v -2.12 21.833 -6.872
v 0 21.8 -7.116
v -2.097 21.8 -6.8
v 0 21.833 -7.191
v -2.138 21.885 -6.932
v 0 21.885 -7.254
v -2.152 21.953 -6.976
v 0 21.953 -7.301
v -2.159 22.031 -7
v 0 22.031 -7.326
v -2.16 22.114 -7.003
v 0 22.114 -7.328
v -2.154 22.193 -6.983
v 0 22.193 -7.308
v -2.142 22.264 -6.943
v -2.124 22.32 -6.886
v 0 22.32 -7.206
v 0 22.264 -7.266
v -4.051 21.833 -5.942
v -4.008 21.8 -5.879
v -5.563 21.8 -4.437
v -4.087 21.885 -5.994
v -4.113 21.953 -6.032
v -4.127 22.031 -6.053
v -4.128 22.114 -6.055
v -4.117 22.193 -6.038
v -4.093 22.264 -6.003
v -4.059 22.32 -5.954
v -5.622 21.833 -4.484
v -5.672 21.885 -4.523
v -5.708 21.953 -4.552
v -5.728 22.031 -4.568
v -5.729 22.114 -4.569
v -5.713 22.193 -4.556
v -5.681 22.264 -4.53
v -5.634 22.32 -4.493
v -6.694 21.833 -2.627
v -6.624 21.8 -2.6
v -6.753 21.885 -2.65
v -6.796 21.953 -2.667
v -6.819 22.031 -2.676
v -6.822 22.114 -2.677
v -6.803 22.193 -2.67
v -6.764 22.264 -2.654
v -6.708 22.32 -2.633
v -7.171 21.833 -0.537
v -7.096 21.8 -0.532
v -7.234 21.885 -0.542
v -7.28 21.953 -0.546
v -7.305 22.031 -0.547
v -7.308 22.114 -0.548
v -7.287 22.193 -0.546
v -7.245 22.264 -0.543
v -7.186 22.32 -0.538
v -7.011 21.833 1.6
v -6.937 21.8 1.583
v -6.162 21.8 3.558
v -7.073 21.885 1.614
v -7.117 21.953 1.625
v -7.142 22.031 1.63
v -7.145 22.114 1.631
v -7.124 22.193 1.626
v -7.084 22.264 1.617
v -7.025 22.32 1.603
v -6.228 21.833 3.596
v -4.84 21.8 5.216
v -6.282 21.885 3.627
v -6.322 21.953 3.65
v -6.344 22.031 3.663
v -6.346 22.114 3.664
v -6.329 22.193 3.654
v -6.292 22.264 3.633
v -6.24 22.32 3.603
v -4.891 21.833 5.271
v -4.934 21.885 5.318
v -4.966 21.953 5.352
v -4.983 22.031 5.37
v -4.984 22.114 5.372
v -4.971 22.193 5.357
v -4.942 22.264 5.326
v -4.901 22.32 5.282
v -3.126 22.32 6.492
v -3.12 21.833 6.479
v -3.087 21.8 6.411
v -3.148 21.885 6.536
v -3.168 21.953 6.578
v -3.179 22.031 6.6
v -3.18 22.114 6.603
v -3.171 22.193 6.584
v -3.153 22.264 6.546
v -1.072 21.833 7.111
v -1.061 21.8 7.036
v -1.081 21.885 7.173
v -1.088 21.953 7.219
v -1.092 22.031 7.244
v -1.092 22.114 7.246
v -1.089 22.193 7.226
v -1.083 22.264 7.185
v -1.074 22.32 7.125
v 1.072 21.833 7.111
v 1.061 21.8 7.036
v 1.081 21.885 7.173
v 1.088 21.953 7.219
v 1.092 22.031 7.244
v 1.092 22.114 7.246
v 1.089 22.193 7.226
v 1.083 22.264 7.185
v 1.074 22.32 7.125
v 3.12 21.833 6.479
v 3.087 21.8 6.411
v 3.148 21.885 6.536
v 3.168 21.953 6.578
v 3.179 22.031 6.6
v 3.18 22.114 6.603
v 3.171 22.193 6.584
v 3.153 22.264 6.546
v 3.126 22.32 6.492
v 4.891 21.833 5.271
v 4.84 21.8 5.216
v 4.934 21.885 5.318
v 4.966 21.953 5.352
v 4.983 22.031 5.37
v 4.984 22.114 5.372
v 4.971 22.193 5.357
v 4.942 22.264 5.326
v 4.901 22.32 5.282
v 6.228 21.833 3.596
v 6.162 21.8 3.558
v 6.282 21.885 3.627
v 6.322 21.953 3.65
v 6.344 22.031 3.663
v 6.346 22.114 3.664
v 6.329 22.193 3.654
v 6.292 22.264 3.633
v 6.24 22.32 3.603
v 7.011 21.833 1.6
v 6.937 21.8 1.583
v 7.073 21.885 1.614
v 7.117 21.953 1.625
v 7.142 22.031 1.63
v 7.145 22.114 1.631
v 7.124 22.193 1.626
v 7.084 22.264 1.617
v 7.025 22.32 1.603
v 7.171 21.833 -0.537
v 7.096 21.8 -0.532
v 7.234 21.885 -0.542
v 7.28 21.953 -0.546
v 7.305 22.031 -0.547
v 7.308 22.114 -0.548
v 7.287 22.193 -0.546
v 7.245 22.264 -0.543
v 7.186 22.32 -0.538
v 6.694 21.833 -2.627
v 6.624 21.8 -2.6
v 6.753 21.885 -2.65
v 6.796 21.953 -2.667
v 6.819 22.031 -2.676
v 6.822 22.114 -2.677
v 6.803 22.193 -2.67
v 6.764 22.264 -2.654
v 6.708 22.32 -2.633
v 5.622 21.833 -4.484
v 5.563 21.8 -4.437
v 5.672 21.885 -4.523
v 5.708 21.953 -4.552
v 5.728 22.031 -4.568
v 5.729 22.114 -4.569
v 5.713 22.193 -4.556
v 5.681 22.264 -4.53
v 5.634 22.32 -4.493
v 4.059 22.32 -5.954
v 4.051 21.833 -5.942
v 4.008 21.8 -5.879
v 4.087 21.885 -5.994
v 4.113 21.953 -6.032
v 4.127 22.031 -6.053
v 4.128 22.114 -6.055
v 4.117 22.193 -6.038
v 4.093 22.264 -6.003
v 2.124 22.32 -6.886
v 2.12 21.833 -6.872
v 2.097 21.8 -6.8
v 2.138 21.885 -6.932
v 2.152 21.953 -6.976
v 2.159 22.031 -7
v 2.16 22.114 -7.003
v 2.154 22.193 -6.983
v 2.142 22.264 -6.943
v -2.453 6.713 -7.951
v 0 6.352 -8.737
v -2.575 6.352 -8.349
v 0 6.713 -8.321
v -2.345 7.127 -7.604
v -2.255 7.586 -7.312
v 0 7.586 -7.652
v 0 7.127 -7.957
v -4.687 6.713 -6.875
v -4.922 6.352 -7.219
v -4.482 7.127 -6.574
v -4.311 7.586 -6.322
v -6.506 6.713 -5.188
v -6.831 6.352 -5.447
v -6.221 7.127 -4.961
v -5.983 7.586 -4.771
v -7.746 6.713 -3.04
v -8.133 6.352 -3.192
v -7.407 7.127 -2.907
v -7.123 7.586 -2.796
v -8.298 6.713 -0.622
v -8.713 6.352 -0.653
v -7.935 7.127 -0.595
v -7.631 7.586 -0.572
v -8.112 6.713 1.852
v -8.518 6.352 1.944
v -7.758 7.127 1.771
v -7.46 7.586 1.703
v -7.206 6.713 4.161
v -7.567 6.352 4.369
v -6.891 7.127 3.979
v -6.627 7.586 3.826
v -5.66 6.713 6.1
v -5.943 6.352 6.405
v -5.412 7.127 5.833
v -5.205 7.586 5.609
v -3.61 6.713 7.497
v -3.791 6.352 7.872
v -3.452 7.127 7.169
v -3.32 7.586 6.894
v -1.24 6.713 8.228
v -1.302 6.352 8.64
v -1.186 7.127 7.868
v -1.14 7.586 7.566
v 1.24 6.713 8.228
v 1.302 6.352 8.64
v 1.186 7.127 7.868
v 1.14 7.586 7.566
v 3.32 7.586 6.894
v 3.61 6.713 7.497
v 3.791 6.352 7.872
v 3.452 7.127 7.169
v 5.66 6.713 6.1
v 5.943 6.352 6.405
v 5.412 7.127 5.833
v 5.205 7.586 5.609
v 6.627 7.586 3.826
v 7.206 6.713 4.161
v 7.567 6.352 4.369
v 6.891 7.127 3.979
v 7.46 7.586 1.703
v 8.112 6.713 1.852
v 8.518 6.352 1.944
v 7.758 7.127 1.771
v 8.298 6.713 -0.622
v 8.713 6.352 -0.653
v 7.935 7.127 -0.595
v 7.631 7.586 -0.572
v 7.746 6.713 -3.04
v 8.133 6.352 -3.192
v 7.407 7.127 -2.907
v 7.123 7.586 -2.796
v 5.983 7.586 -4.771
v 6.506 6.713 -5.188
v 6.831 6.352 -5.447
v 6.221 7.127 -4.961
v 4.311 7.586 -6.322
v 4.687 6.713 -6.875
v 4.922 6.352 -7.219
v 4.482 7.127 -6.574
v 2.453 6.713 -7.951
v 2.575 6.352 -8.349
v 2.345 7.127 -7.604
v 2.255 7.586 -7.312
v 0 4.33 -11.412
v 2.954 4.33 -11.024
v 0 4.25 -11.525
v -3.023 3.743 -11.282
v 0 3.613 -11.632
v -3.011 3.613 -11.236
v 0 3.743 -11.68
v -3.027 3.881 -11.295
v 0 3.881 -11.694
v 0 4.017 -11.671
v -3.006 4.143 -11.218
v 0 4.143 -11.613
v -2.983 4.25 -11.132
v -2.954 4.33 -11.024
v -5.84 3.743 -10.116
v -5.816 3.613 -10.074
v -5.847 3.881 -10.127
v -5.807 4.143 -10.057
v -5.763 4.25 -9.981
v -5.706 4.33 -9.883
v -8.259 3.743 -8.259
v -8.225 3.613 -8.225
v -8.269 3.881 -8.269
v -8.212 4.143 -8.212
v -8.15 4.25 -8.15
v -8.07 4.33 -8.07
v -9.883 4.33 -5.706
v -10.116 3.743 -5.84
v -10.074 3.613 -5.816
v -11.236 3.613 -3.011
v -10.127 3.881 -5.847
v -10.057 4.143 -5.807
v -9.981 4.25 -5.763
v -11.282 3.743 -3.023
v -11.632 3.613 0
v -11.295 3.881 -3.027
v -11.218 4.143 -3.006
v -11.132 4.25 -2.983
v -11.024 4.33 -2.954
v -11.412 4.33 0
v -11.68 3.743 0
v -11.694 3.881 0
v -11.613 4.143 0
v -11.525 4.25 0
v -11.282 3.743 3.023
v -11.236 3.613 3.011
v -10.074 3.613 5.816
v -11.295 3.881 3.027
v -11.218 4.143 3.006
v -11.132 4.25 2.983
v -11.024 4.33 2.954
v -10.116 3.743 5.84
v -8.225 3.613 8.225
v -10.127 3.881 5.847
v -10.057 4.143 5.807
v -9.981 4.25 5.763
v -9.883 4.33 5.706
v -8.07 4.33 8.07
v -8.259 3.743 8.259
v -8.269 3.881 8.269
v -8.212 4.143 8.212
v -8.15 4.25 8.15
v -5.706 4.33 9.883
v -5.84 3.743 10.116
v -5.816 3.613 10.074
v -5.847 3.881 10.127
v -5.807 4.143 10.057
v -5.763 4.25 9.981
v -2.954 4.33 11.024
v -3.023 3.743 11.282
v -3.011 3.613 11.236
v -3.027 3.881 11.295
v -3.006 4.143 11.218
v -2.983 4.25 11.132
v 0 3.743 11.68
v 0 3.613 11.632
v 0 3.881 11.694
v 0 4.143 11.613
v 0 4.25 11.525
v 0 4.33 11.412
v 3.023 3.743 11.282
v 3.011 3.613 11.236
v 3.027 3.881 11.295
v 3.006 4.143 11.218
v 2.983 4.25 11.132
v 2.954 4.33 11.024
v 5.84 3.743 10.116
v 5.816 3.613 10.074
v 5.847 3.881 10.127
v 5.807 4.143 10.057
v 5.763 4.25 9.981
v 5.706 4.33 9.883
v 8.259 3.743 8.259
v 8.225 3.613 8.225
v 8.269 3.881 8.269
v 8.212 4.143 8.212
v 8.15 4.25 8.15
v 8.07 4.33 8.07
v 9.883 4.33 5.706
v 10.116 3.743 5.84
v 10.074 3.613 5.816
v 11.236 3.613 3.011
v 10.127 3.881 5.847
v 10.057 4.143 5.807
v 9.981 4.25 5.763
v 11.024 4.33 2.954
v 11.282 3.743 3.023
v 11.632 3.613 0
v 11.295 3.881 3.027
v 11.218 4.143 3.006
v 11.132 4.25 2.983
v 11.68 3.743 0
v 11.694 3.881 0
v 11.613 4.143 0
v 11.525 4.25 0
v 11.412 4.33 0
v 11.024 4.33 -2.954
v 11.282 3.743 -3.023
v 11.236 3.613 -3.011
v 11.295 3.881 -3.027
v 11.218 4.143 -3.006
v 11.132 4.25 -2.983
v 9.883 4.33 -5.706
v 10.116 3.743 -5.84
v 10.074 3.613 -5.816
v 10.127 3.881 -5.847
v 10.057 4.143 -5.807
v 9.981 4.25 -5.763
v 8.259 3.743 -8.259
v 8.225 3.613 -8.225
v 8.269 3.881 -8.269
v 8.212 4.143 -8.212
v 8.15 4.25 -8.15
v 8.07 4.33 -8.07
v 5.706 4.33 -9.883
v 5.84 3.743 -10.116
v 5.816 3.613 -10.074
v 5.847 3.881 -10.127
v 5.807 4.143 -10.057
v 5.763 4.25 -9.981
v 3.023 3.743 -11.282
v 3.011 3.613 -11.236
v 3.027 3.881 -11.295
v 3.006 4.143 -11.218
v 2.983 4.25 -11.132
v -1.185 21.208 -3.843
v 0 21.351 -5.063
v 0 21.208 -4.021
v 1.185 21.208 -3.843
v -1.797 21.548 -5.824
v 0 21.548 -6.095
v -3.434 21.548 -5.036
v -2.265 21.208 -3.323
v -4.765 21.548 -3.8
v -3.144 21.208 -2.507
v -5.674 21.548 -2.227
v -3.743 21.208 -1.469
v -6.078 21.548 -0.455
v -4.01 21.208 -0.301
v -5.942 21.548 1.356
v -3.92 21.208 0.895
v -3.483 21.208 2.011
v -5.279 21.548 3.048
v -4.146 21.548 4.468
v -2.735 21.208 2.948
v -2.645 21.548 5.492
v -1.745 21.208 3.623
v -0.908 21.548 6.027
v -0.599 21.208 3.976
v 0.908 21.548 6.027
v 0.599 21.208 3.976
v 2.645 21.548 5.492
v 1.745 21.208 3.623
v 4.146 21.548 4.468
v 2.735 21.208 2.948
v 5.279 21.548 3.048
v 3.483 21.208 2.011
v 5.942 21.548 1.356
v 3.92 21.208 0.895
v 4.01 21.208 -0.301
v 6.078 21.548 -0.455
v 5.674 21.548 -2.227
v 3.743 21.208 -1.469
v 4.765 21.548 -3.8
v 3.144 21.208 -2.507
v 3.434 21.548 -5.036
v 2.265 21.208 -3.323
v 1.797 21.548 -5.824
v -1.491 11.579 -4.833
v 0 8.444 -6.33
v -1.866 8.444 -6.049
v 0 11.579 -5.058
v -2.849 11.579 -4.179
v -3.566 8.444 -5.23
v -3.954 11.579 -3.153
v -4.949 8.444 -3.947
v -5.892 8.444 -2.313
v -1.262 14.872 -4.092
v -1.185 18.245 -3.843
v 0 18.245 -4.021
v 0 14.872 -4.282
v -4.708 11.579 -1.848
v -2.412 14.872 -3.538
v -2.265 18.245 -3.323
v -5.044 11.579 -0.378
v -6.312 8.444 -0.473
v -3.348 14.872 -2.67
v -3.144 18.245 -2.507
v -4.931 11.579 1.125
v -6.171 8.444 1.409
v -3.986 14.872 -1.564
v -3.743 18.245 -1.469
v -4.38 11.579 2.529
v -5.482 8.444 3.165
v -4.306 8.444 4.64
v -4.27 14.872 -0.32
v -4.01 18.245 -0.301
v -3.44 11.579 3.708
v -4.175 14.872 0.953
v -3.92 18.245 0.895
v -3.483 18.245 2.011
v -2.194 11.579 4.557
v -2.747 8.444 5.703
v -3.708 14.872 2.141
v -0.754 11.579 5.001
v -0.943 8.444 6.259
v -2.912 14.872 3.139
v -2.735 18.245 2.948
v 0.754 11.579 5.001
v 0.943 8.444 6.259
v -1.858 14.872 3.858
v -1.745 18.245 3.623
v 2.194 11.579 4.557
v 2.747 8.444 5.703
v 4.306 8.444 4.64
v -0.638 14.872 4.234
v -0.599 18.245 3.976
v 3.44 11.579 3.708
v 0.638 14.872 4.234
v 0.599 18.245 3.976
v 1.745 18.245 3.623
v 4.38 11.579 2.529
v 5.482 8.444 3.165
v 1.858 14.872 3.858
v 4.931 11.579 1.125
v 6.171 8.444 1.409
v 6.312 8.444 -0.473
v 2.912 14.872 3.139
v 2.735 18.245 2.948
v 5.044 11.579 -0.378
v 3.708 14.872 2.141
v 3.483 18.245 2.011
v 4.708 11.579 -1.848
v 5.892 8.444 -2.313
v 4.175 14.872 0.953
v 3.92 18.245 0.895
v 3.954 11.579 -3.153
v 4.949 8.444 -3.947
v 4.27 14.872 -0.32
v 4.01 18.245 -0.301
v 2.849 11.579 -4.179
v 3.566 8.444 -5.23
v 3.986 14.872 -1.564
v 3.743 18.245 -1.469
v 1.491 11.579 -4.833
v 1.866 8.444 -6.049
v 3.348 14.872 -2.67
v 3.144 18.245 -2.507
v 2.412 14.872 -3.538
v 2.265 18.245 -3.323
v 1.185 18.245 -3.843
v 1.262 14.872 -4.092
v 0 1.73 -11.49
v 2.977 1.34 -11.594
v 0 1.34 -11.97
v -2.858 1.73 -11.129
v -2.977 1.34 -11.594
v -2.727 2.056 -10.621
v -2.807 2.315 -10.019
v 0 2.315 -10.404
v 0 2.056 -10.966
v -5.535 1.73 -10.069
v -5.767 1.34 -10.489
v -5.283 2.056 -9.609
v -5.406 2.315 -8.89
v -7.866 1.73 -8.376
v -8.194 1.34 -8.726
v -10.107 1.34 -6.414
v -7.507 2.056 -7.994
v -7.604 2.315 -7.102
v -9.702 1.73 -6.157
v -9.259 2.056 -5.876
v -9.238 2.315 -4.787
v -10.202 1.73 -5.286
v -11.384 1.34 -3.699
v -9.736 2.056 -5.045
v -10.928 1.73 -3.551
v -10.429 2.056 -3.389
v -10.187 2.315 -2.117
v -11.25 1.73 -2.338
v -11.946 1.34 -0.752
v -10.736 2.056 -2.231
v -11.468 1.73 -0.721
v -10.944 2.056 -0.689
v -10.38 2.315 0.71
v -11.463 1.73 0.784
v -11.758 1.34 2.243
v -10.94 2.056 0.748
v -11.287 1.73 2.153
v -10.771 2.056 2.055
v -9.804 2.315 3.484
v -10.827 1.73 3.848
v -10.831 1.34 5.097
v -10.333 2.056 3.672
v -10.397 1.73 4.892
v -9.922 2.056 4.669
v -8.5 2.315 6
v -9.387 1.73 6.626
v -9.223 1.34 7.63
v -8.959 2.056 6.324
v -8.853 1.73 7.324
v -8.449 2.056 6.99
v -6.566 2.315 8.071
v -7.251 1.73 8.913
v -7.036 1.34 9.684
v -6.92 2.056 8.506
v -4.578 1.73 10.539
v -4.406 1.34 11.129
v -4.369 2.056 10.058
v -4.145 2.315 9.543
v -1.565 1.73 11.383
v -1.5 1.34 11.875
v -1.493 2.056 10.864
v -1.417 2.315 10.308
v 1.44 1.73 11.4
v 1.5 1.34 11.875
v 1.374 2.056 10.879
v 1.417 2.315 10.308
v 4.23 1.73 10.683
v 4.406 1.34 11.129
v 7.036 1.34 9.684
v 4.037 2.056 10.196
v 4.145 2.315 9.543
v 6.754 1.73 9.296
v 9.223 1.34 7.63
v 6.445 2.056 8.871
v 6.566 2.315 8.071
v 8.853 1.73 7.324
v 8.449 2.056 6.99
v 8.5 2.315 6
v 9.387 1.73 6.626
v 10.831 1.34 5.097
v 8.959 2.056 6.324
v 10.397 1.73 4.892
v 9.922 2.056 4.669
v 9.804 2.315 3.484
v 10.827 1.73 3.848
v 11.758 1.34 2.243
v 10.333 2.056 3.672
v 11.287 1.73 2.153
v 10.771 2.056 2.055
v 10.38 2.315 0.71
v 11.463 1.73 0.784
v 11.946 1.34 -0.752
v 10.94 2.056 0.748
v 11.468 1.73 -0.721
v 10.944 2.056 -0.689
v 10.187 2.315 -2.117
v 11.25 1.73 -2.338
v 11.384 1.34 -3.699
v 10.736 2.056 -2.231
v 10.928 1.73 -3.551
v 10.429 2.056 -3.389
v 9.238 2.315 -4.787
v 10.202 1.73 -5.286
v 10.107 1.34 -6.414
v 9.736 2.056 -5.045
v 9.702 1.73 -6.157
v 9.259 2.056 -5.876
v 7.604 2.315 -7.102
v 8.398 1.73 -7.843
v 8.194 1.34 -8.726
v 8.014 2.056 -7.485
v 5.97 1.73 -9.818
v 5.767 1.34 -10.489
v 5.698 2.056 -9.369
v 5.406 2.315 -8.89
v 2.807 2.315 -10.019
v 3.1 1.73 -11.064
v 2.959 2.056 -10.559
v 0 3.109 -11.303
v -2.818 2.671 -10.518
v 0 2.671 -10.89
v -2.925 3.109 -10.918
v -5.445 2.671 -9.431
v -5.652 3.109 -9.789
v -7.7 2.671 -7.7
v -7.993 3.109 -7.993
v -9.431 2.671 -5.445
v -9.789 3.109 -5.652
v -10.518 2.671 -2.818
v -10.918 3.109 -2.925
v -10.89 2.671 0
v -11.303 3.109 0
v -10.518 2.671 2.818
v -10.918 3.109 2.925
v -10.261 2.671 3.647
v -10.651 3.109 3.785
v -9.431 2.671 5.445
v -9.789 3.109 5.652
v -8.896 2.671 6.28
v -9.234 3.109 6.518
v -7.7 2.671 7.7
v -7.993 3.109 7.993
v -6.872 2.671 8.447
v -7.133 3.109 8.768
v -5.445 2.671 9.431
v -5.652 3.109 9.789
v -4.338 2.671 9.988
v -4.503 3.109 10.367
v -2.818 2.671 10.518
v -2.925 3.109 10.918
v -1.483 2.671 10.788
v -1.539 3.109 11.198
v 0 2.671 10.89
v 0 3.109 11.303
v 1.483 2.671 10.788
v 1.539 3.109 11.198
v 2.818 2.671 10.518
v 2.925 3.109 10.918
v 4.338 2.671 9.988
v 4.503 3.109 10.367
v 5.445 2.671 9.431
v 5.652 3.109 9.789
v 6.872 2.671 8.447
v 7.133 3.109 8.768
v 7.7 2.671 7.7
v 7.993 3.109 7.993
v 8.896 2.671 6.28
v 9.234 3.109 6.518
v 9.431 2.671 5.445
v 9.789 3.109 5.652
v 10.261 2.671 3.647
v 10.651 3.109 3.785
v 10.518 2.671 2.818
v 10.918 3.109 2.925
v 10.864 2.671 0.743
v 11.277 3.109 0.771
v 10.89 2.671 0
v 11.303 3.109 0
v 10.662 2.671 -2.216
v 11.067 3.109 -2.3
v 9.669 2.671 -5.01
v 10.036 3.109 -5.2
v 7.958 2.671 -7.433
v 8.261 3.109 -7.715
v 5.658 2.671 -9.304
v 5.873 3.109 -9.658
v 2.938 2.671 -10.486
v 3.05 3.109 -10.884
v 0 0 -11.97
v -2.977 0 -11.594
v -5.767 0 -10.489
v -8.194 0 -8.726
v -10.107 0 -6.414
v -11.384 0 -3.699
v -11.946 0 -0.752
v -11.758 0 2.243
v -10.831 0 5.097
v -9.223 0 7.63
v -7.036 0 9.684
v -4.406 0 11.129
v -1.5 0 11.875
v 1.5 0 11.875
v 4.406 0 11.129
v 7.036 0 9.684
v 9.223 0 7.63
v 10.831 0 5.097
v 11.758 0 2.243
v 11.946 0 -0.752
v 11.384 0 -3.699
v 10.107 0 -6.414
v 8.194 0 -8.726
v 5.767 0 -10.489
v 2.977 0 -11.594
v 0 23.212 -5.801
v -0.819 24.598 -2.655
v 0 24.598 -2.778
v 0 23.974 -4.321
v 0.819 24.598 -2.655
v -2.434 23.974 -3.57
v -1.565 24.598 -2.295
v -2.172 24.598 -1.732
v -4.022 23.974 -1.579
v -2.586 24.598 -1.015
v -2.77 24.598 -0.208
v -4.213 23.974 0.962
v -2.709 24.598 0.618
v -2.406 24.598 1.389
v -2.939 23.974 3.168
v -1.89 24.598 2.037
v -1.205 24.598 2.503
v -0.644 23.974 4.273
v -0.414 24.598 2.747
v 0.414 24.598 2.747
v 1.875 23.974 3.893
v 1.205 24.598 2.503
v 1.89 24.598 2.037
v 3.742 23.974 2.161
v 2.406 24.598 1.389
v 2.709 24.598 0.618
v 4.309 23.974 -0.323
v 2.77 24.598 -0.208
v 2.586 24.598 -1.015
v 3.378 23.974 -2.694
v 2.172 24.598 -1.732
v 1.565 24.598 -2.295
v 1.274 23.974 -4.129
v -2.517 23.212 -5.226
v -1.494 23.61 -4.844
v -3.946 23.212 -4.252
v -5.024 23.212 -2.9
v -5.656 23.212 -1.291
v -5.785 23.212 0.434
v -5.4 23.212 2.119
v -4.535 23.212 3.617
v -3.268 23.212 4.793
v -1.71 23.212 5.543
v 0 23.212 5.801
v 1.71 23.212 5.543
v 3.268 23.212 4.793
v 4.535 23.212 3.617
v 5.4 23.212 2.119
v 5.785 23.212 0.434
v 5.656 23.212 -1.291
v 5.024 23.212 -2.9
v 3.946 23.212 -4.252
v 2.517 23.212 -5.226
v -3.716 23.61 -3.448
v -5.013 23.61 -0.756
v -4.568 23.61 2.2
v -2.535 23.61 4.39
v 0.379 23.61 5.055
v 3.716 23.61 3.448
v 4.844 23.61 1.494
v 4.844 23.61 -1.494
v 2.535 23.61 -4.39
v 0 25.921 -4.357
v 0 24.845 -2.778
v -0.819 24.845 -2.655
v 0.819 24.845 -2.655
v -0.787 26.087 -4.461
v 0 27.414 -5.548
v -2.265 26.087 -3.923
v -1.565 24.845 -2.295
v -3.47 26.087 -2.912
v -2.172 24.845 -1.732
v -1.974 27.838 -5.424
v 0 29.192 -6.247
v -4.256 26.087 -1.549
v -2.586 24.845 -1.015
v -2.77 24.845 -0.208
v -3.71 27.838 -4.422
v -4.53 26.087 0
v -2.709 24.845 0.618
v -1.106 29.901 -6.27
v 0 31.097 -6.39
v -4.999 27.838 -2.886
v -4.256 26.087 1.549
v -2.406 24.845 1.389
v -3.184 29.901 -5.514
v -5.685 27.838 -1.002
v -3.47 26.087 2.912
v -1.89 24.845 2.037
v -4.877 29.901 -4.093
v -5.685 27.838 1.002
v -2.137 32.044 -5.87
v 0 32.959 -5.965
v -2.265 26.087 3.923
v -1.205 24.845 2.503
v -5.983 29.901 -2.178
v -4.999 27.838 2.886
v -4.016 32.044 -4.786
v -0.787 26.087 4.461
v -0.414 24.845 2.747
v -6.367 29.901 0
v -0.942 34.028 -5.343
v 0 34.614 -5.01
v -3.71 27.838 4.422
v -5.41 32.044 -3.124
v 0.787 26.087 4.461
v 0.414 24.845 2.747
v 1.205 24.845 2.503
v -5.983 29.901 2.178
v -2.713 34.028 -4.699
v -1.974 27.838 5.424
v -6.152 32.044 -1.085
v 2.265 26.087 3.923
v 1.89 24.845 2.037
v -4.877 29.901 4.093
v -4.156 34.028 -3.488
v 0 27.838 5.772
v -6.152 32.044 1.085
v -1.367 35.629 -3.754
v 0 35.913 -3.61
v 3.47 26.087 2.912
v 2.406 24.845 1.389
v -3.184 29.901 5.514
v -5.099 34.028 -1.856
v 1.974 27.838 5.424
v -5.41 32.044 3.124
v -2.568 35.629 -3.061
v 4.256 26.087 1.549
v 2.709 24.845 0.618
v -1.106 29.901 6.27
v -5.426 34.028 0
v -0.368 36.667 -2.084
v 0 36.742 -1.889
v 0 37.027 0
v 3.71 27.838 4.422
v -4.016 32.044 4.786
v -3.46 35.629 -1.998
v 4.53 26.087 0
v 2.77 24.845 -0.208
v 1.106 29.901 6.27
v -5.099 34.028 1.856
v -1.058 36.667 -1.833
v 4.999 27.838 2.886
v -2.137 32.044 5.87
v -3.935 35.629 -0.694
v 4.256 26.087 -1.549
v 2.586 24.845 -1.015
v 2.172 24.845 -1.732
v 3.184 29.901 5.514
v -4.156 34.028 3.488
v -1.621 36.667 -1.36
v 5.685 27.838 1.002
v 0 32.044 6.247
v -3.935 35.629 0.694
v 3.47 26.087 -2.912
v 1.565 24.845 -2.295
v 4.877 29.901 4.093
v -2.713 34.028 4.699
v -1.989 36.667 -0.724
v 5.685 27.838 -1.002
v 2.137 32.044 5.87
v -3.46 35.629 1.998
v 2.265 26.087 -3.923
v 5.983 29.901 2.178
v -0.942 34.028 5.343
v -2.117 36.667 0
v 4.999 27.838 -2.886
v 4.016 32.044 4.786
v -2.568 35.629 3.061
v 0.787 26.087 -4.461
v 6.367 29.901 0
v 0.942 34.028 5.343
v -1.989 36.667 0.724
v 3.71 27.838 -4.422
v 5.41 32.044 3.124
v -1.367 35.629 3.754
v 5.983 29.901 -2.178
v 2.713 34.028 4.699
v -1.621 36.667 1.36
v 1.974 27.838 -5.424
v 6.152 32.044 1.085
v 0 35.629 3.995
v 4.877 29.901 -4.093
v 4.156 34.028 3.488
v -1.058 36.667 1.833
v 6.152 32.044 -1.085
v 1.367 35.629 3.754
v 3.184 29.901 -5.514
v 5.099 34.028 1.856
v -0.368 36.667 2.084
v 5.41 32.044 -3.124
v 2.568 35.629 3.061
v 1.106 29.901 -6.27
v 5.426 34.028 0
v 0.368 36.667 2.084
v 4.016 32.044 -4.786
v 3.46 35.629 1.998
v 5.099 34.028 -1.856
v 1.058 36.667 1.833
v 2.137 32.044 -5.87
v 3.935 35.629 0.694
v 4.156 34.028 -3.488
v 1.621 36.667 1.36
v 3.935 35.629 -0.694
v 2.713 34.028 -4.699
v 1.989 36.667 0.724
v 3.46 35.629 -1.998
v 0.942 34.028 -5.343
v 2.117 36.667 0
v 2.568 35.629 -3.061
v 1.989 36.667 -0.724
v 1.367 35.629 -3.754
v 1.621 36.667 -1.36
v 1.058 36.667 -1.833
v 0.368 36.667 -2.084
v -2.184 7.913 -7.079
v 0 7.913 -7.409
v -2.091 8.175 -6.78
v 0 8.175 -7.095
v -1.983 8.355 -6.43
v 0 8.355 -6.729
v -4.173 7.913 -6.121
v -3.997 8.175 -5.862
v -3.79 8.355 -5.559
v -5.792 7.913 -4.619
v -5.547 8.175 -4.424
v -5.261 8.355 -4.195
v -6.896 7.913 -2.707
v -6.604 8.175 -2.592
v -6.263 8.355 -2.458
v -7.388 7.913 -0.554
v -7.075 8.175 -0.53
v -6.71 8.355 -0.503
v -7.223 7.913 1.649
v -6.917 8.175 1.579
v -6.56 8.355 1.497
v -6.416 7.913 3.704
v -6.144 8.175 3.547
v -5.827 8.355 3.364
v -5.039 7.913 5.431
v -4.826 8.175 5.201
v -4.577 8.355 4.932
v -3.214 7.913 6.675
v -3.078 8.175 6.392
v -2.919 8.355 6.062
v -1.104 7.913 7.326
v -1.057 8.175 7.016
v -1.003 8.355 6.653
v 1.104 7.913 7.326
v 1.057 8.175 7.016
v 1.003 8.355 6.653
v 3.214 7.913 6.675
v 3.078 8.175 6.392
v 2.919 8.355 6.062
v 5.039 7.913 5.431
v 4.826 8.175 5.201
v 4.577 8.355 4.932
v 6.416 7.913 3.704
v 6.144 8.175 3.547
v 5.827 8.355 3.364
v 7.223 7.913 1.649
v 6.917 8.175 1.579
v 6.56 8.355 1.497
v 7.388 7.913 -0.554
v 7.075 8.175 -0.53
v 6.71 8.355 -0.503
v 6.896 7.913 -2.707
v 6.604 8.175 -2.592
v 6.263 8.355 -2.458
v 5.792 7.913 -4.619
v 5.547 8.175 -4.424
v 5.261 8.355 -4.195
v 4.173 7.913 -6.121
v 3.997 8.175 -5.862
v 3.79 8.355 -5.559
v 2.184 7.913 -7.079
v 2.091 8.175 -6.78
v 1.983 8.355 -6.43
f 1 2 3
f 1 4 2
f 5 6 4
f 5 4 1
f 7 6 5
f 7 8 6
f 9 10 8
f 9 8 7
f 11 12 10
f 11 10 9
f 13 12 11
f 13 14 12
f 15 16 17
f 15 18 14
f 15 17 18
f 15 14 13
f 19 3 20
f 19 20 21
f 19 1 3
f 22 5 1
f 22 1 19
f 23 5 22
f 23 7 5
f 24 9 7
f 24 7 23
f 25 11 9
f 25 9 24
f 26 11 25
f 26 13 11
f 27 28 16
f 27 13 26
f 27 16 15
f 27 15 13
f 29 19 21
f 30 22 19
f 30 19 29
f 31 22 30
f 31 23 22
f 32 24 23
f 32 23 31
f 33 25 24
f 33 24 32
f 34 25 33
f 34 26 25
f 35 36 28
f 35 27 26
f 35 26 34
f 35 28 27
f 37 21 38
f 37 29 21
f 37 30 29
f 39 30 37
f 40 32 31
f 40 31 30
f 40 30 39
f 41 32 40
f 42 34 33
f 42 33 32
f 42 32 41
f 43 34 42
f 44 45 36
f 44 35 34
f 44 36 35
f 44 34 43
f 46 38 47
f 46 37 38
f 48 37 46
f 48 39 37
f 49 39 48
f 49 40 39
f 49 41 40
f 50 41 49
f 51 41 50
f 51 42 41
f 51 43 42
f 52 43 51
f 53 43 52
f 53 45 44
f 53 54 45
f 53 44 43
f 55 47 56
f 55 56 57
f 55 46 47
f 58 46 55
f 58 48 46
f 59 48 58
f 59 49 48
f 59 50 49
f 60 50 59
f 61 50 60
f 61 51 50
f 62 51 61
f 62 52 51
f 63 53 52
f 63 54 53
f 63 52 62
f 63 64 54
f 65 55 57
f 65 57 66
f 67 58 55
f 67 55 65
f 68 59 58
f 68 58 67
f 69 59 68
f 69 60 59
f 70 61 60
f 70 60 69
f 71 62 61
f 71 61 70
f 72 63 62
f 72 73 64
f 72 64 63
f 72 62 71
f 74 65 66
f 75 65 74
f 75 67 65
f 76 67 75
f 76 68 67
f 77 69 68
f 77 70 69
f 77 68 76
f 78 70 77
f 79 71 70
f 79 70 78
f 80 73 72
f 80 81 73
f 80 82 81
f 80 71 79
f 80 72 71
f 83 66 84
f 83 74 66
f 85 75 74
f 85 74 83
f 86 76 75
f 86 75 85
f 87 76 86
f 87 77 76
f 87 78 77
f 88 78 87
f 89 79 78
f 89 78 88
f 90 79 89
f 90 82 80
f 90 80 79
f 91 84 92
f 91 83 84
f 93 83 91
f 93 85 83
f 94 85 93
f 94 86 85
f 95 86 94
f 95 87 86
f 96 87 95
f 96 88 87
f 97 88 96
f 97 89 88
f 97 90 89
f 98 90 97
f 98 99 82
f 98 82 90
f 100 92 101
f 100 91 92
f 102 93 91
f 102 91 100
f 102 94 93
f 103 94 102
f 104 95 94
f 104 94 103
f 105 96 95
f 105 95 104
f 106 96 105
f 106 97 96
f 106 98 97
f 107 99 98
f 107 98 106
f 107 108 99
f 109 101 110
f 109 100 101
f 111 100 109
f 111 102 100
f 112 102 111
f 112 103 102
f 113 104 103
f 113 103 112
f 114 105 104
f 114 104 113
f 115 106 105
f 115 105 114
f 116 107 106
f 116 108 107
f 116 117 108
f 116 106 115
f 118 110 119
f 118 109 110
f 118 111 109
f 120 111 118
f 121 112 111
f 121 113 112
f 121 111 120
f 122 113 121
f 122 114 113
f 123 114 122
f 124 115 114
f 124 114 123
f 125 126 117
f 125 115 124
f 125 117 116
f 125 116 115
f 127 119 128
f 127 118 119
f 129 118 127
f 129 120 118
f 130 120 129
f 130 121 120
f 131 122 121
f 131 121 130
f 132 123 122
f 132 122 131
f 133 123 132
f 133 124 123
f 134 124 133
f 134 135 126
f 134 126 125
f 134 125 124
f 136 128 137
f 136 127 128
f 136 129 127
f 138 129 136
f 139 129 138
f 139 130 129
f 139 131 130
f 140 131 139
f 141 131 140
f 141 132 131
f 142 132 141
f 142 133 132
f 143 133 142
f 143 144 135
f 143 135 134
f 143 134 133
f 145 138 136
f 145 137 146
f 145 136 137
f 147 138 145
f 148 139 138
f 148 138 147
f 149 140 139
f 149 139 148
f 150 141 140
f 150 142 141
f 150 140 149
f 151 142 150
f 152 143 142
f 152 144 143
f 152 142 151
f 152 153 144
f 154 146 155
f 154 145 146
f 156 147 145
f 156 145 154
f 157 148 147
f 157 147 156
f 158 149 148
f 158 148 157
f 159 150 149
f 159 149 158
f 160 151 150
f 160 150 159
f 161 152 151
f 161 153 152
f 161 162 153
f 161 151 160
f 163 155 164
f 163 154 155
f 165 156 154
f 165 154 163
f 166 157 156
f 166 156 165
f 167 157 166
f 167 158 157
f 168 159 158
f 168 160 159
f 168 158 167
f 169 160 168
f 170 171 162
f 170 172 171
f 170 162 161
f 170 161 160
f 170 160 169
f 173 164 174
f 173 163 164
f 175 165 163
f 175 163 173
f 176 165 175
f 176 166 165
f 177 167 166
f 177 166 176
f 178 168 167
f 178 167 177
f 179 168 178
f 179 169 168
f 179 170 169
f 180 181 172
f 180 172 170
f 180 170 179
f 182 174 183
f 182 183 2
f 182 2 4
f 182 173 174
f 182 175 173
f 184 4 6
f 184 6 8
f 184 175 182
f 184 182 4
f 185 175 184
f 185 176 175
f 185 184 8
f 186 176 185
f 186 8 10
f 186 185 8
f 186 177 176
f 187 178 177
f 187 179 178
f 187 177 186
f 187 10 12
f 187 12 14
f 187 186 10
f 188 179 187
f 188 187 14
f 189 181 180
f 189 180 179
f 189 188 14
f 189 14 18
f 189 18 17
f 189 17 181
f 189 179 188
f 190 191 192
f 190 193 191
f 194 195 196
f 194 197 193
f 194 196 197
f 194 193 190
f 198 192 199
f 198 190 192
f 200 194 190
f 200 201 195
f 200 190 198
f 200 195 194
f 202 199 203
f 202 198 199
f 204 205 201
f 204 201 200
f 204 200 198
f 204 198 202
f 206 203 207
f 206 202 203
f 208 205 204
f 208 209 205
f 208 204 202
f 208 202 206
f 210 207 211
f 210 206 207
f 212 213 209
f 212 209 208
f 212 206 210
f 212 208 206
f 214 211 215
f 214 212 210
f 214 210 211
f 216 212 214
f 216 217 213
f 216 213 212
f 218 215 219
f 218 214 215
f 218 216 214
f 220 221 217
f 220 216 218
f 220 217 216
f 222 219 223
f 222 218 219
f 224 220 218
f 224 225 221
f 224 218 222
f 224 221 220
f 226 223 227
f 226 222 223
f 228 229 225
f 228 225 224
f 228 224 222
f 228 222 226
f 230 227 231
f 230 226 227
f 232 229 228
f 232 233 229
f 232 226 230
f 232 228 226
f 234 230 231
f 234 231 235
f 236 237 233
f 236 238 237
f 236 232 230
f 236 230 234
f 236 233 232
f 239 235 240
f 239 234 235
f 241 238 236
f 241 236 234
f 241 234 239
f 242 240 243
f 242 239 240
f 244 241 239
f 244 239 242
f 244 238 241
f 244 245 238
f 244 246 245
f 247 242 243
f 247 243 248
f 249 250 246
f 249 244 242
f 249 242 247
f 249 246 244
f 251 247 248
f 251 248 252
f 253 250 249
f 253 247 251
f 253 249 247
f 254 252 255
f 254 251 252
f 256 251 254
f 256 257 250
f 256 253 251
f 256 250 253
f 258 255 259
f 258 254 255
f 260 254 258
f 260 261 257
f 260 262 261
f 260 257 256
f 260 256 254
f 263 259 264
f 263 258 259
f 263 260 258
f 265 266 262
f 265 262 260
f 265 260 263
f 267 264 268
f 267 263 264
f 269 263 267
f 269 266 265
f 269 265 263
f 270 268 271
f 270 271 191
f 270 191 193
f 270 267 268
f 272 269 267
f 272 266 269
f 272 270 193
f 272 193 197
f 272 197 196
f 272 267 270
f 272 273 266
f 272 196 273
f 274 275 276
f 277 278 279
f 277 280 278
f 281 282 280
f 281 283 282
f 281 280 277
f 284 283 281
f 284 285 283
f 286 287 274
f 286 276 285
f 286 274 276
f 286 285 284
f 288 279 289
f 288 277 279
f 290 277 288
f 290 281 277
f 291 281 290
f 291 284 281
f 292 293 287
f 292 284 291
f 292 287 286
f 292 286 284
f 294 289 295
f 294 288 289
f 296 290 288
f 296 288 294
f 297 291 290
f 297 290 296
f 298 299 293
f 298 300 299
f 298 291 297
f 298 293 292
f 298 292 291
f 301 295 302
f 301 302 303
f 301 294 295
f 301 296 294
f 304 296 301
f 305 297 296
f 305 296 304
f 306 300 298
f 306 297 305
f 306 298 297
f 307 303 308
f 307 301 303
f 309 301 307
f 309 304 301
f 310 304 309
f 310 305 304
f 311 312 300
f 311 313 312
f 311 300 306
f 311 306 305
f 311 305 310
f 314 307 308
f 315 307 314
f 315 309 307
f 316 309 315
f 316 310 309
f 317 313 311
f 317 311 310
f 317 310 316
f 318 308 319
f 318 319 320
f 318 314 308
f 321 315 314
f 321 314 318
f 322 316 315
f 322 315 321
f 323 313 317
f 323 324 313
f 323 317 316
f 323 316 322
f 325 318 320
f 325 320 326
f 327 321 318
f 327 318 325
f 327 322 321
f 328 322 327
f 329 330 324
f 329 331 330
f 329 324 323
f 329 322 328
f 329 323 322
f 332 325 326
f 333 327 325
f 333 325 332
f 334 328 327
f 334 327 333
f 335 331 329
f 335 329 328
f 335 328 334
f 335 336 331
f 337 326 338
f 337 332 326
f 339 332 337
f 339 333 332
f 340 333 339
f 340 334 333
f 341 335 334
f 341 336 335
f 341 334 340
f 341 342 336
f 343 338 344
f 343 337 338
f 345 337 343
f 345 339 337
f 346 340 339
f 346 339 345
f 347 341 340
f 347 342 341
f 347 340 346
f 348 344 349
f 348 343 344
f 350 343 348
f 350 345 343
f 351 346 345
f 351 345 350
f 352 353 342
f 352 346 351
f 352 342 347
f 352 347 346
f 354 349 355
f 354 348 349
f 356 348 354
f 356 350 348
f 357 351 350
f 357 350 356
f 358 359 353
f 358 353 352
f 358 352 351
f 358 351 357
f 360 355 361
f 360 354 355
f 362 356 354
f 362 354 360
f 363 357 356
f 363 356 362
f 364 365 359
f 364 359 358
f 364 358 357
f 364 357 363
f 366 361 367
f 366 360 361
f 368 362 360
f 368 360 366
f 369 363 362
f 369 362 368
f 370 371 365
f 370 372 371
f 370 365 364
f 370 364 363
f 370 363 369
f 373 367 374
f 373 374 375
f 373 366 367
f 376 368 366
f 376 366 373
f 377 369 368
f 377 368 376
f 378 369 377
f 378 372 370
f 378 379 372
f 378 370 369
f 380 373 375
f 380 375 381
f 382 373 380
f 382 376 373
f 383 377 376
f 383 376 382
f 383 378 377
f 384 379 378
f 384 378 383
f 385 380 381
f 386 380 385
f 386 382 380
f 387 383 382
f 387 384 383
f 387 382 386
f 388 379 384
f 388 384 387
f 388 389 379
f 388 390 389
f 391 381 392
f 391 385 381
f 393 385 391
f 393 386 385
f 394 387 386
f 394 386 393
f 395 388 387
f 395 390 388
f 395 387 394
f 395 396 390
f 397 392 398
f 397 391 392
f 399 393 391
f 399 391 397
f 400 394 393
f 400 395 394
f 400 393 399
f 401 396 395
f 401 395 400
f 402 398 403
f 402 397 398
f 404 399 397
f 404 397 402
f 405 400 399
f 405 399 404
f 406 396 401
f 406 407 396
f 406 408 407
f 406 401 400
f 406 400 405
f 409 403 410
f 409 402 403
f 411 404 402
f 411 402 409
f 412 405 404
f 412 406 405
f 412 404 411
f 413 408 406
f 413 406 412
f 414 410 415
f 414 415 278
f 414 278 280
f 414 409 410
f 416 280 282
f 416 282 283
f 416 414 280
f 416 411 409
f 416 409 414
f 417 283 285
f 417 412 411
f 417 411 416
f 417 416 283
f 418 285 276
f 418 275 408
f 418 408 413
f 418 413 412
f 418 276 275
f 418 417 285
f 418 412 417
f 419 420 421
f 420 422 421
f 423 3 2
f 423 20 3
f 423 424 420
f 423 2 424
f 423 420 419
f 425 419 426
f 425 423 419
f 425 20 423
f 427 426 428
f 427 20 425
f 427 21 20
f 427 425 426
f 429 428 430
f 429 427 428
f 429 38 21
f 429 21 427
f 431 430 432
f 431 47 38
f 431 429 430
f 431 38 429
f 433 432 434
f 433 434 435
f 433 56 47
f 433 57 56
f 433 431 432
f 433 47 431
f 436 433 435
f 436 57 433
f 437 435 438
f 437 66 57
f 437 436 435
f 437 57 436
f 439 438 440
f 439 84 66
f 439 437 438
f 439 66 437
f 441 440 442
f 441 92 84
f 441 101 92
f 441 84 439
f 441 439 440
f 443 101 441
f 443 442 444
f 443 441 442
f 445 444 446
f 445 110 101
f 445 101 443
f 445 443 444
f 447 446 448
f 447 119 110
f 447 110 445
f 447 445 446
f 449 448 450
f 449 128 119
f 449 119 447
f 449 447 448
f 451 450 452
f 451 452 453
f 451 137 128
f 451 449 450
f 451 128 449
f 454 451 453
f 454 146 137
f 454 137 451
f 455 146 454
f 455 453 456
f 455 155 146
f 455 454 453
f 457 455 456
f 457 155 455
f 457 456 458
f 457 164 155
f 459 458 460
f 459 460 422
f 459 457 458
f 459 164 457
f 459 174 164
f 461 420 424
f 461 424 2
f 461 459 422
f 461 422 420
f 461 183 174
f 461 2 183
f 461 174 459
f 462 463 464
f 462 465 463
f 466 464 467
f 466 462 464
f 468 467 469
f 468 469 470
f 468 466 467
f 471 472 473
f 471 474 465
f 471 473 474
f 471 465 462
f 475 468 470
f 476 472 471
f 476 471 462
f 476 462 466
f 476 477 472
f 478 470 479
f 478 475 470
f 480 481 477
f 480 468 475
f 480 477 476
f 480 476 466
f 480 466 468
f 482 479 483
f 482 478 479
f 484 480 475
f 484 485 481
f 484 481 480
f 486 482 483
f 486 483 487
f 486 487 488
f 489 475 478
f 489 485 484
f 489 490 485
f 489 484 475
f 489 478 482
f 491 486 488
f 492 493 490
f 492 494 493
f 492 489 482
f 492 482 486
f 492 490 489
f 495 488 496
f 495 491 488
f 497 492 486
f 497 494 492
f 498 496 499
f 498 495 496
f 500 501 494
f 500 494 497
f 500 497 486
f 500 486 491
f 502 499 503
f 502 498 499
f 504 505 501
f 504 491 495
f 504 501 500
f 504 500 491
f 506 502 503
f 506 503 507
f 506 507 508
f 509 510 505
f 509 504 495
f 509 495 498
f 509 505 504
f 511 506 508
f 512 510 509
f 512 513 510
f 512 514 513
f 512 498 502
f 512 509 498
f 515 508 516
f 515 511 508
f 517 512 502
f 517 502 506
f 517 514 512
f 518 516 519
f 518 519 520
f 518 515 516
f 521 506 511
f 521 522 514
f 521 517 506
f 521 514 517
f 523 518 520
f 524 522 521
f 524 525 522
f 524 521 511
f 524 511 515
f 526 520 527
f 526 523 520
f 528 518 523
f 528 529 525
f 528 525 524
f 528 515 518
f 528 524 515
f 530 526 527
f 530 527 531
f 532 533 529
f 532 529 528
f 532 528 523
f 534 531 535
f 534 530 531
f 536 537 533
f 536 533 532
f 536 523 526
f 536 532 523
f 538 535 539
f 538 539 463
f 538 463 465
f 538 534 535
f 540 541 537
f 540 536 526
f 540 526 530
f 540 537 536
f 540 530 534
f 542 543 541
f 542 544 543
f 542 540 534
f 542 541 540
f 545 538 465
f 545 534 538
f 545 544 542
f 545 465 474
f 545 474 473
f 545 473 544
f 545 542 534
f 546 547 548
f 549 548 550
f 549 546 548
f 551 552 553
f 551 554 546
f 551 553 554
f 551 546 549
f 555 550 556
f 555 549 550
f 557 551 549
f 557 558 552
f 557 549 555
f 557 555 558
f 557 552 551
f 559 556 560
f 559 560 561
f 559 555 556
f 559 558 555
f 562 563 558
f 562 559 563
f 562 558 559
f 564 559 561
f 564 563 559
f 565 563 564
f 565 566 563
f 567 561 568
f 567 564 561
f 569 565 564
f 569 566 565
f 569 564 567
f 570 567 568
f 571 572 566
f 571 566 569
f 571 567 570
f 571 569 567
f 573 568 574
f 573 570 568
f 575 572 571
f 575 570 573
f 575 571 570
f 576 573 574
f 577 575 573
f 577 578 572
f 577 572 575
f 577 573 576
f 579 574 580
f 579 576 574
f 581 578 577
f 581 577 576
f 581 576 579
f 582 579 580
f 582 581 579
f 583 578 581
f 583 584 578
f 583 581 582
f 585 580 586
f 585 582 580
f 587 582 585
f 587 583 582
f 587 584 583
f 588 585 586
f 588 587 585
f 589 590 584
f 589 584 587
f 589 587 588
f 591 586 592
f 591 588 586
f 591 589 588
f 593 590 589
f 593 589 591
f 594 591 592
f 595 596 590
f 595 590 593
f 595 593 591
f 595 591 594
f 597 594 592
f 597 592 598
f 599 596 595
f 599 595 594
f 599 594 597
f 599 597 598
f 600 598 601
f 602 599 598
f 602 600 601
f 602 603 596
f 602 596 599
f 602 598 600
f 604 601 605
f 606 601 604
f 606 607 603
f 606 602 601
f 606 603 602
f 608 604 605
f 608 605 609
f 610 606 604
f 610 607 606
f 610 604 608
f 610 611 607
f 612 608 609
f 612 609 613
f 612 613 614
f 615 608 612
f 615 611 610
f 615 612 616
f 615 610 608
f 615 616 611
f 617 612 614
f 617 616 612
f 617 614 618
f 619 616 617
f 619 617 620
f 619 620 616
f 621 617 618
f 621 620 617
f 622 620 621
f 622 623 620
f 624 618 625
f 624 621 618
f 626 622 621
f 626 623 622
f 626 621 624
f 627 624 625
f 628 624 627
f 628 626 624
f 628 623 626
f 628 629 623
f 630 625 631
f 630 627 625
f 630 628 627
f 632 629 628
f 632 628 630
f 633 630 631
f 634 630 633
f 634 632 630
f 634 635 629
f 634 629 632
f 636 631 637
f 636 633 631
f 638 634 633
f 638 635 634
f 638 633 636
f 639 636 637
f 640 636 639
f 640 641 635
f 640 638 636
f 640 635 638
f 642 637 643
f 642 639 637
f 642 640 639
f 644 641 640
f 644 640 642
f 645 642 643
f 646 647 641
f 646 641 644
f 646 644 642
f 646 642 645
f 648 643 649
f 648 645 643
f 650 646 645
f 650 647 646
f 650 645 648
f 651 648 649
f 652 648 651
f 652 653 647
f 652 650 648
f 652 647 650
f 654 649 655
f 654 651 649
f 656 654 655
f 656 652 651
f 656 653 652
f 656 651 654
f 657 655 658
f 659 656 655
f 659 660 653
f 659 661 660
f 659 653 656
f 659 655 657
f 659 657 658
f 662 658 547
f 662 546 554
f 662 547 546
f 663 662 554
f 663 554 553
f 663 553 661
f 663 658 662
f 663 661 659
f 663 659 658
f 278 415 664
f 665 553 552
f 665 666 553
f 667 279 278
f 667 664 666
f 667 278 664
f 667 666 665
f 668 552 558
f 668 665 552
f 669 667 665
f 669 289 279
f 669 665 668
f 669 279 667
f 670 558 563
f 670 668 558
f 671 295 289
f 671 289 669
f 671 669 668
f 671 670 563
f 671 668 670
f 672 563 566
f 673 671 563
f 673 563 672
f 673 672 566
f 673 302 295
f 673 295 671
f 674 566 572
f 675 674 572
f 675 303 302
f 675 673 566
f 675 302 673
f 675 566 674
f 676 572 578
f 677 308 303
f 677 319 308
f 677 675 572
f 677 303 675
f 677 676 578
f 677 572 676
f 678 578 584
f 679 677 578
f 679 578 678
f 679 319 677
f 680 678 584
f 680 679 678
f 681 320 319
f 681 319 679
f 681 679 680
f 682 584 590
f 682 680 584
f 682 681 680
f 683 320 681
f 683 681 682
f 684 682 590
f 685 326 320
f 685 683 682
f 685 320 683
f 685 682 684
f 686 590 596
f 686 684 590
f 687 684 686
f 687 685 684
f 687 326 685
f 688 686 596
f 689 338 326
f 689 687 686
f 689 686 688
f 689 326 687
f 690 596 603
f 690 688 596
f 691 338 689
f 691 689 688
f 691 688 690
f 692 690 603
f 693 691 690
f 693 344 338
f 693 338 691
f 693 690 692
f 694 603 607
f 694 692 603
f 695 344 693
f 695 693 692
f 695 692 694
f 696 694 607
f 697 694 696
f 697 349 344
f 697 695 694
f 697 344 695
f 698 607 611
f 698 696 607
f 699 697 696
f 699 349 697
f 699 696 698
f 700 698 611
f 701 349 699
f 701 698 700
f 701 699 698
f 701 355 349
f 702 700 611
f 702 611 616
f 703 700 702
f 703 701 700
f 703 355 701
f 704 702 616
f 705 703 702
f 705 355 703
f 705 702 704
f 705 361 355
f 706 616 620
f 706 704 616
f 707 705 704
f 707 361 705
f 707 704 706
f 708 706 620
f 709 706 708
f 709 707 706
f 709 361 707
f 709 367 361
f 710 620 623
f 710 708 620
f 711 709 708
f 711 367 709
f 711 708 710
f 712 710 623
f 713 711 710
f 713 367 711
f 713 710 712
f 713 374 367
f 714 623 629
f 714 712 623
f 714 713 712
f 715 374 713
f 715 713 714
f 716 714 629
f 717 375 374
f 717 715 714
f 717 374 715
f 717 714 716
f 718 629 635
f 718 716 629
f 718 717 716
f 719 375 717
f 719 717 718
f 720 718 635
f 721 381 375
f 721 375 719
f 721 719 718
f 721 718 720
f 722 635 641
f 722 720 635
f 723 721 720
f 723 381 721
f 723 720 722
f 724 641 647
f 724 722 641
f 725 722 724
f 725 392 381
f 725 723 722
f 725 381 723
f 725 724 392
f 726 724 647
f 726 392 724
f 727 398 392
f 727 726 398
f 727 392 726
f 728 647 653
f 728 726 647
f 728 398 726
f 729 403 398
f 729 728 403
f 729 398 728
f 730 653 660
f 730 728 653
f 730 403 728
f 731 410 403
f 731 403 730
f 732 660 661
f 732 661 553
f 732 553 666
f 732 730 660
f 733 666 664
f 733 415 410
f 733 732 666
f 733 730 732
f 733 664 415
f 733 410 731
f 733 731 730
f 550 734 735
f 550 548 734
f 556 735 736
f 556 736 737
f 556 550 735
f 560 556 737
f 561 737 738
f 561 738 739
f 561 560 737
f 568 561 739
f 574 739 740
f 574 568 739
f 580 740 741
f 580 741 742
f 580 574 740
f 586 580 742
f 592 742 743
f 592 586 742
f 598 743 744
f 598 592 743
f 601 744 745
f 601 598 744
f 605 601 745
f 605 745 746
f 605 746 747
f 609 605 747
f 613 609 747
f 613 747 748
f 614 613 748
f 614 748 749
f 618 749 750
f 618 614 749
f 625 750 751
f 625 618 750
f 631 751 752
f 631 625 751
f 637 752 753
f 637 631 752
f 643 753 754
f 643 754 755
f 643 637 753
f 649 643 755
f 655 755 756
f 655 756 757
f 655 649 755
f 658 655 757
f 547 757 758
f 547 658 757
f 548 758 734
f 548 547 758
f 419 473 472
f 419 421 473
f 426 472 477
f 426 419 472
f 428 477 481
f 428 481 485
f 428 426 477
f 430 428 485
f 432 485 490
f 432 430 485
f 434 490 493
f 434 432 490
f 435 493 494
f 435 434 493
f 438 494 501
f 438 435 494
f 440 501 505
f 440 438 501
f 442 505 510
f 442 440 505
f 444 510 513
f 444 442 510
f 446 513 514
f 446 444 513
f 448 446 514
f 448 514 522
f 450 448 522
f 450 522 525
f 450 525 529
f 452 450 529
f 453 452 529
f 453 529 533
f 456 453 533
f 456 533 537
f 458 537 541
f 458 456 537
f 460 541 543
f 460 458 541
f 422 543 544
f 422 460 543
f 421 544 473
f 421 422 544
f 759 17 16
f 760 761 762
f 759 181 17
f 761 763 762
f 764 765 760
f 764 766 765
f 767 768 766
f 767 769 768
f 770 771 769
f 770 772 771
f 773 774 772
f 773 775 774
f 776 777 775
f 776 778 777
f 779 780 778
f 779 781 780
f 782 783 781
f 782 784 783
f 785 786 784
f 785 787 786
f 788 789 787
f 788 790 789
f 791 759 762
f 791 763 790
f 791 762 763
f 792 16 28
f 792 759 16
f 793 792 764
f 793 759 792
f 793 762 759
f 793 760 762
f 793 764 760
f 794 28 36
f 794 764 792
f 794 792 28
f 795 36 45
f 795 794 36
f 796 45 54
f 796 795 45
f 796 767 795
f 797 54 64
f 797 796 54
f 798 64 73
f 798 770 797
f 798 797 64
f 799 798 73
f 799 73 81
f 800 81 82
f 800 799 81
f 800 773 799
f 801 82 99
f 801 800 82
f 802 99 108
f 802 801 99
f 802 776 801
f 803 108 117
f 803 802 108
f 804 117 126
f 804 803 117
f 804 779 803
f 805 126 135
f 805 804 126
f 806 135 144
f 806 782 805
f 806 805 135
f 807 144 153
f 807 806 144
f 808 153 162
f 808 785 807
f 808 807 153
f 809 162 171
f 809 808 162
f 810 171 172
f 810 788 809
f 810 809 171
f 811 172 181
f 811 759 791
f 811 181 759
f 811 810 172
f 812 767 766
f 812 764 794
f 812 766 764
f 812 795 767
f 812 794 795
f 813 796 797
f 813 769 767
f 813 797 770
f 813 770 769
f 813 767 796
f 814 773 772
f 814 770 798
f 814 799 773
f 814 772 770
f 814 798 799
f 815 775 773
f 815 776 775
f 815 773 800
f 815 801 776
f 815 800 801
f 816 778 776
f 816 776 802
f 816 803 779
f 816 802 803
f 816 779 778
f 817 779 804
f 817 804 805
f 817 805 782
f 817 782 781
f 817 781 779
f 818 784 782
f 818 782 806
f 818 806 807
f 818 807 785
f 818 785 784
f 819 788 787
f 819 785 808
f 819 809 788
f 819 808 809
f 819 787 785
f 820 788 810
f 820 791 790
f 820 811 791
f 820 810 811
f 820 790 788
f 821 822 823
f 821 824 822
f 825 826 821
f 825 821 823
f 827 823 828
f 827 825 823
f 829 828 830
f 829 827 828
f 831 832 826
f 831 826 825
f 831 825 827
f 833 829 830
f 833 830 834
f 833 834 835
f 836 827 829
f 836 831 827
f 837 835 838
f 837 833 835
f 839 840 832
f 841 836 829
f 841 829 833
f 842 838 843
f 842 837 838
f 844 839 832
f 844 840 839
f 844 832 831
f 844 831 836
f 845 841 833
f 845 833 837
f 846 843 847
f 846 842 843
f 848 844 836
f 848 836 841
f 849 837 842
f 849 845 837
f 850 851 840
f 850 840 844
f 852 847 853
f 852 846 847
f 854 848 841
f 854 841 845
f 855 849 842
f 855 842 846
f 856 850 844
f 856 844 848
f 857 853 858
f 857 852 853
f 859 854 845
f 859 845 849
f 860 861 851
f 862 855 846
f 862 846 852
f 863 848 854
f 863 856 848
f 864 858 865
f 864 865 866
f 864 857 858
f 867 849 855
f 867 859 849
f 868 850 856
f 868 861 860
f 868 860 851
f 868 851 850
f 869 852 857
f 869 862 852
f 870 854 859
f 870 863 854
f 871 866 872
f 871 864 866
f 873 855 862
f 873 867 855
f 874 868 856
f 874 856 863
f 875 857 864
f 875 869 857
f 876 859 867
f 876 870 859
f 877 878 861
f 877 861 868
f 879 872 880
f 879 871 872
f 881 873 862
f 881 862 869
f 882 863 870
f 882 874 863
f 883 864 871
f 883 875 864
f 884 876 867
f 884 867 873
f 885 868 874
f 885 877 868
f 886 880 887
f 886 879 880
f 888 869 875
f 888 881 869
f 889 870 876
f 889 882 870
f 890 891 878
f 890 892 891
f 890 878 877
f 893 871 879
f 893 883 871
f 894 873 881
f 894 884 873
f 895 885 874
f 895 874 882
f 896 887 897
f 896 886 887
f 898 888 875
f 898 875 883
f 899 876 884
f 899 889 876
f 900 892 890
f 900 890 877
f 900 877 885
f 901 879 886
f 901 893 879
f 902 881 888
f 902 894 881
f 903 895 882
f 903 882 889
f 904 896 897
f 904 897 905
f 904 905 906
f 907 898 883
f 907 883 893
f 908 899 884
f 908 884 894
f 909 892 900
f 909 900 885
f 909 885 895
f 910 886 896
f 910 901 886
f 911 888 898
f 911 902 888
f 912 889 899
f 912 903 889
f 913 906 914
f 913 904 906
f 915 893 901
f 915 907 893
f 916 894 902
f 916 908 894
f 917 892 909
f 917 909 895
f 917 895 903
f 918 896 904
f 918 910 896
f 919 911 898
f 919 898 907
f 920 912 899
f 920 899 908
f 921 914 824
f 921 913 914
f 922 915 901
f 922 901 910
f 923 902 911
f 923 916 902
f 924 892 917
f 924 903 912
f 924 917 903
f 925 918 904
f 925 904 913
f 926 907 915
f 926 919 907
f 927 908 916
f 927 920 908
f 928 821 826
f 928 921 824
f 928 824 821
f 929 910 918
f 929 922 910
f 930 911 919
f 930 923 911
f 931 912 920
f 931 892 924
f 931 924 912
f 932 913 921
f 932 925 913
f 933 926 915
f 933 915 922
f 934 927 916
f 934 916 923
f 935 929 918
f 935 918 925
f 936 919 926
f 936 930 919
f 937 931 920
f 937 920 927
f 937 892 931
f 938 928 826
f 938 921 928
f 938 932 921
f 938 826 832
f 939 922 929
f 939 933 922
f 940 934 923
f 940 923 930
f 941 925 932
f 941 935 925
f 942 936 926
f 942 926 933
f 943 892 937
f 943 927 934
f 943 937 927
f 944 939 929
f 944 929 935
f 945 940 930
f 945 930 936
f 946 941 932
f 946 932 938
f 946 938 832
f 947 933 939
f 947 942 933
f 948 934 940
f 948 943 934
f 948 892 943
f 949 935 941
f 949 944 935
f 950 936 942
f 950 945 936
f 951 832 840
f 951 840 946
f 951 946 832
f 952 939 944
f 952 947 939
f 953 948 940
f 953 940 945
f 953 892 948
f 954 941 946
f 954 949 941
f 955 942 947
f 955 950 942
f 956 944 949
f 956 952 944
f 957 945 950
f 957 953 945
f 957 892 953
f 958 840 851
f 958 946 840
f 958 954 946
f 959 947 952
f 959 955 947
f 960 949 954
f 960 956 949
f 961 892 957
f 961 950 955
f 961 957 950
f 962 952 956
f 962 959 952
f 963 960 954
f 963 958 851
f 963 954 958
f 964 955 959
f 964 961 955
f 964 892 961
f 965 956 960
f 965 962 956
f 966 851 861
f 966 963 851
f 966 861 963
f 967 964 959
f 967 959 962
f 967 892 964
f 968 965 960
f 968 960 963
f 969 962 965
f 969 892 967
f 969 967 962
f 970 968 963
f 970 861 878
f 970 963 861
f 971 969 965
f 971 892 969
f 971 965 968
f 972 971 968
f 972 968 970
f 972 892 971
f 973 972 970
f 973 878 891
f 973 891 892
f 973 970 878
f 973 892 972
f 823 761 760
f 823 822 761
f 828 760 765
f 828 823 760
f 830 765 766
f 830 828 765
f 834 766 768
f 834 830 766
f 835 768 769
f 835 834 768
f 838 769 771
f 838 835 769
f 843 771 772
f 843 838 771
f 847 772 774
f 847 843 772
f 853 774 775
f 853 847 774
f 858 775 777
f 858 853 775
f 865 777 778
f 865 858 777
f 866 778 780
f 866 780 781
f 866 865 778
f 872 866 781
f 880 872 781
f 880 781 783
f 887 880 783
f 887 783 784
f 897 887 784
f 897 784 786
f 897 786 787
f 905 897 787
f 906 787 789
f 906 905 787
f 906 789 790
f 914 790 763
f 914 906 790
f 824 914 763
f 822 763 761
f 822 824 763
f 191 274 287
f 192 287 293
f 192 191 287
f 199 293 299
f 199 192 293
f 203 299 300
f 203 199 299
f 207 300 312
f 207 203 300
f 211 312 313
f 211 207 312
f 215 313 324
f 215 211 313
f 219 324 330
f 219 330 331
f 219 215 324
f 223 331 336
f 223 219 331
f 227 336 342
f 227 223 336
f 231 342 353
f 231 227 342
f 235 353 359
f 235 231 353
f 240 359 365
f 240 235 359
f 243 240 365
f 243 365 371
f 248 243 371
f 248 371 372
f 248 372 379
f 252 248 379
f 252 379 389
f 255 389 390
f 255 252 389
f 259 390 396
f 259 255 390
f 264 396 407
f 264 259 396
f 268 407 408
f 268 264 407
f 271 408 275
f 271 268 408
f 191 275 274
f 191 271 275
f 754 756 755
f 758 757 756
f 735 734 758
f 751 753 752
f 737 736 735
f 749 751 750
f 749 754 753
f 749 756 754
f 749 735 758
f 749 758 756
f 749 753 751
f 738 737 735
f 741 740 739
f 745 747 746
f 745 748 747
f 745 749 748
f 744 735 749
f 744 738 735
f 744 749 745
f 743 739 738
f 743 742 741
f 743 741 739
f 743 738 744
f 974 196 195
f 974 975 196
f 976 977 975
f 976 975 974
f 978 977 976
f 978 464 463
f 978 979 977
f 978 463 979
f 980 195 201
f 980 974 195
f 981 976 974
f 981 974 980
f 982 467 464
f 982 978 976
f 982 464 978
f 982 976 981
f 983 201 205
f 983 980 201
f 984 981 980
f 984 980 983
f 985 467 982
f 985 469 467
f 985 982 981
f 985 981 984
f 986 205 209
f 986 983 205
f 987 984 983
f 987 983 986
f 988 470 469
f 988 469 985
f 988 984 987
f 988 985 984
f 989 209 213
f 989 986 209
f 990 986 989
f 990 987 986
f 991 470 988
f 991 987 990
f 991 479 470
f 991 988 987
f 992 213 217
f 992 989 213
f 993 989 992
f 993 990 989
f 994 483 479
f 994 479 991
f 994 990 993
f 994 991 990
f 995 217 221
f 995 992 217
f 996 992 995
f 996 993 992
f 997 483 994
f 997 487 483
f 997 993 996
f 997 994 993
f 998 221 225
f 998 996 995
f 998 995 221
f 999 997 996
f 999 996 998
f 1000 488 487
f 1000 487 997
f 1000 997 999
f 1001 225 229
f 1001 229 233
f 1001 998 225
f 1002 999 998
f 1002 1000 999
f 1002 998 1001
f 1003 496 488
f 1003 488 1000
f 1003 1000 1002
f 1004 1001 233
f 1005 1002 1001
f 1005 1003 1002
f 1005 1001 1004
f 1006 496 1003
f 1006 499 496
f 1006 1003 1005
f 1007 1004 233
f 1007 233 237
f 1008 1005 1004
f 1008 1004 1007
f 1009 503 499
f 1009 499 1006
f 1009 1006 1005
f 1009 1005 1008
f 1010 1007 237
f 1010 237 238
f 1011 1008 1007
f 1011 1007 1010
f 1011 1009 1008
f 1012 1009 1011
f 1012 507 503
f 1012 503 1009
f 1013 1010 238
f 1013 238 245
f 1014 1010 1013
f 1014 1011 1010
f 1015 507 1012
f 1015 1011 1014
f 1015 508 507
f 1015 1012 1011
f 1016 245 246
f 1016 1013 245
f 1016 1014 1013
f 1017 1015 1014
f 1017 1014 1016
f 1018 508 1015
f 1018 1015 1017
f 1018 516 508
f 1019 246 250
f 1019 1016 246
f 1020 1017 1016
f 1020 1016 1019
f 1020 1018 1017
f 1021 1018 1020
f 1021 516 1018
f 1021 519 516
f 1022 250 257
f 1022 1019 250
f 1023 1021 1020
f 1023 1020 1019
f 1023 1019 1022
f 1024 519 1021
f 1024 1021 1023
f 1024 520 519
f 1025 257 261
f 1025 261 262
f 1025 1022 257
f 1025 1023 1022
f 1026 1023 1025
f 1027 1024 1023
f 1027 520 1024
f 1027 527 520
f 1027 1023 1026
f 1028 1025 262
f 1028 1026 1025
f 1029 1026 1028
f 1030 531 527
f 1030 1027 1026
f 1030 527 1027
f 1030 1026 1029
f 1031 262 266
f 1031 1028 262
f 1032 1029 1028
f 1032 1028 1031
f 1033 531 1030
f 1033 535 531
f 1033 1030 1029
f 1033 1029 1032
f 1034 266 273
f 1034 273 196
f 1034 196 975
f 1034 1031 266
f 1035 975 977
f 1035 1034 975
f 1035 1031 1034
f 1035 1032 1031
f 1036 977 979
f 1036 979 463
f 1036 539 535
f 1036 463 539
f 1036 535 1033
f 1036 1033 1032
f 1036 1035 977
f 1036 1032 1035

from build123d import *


with BuildPart() as part:
    # Sketch2 → Revolve1 (revolve)
    with BuildSketch(Plane.XY, mode=Mode.PRIVATE) as revolve1_sk:
        with BuildLine():
            Line((0, 0), (-11.96988083, 0))
            Line((-11.96988083, 0), (-11.96988083, 1.340283376))
            ThreePointArc((-11.96988083, 1.340283376), (-11.2331295, 1.901248909), (-10.404461542, 2.314521541))
            ThreePointArc((-10.404461542, 2.314521541), (-11.106179845, 2.880731417), (-11.63207258, 3.613151399))
            ThreePointArc((-11.63207258, 3.613151399), (-11.670741013, 4.017061246), (-11.412476332, 4.330011348))
            Line((-11.412476332, 4.330011348), (-8.737098944, 6.352490289))
            ThreePointArc((-8.737098944, 6.352490289), (-8.132098156, 6.91410221), (-7.651964701, 7.585597383))
            ThreePointArc((-7.651964701, 7.585597383), (-7.094925104, 8.174757479), (-6.330073896, 8.443839921))
            ThreePointArc((-6.330073896, 8.443839921), (-4.606295289, 13.210063627), (-4.021311984, 18.244554231))
            Line((-4.021311984, 18.244554231), (-4.021311984, 21.208163842))
            ThreePointArc((-4.021311984, 21.208163842), (-5.580309883, 21.442384278), (-7.115742629, 21.799847488))
            ThreePointArc((-7.115742629, 21.799847488), (-7.325805309, 22.03138024), (-7.205776672, 22.320044181))
            ThreePointArc((-7.205776672, 22.320044181), (-5.06963874, 23.609952102), (-2.778232272, 24.598083726))
            Line((-2.778232272, 24.598083726), (-2.778232272, 24.845430157))
            ThreePointArc((-2.778232272, 24.845430157), (-6.247093969, 32.04409144), (0, 37.026815862))
            Line((0, 37.026815862), (0, 0))
        make_face()
    revolve(revolve1_sk.sketch.rotate(Axis((0, 0, 0), (0, 1, 0)), 270), axis=Axis((0, 0, 0), (0, 1, 0)))


solid = part.part
